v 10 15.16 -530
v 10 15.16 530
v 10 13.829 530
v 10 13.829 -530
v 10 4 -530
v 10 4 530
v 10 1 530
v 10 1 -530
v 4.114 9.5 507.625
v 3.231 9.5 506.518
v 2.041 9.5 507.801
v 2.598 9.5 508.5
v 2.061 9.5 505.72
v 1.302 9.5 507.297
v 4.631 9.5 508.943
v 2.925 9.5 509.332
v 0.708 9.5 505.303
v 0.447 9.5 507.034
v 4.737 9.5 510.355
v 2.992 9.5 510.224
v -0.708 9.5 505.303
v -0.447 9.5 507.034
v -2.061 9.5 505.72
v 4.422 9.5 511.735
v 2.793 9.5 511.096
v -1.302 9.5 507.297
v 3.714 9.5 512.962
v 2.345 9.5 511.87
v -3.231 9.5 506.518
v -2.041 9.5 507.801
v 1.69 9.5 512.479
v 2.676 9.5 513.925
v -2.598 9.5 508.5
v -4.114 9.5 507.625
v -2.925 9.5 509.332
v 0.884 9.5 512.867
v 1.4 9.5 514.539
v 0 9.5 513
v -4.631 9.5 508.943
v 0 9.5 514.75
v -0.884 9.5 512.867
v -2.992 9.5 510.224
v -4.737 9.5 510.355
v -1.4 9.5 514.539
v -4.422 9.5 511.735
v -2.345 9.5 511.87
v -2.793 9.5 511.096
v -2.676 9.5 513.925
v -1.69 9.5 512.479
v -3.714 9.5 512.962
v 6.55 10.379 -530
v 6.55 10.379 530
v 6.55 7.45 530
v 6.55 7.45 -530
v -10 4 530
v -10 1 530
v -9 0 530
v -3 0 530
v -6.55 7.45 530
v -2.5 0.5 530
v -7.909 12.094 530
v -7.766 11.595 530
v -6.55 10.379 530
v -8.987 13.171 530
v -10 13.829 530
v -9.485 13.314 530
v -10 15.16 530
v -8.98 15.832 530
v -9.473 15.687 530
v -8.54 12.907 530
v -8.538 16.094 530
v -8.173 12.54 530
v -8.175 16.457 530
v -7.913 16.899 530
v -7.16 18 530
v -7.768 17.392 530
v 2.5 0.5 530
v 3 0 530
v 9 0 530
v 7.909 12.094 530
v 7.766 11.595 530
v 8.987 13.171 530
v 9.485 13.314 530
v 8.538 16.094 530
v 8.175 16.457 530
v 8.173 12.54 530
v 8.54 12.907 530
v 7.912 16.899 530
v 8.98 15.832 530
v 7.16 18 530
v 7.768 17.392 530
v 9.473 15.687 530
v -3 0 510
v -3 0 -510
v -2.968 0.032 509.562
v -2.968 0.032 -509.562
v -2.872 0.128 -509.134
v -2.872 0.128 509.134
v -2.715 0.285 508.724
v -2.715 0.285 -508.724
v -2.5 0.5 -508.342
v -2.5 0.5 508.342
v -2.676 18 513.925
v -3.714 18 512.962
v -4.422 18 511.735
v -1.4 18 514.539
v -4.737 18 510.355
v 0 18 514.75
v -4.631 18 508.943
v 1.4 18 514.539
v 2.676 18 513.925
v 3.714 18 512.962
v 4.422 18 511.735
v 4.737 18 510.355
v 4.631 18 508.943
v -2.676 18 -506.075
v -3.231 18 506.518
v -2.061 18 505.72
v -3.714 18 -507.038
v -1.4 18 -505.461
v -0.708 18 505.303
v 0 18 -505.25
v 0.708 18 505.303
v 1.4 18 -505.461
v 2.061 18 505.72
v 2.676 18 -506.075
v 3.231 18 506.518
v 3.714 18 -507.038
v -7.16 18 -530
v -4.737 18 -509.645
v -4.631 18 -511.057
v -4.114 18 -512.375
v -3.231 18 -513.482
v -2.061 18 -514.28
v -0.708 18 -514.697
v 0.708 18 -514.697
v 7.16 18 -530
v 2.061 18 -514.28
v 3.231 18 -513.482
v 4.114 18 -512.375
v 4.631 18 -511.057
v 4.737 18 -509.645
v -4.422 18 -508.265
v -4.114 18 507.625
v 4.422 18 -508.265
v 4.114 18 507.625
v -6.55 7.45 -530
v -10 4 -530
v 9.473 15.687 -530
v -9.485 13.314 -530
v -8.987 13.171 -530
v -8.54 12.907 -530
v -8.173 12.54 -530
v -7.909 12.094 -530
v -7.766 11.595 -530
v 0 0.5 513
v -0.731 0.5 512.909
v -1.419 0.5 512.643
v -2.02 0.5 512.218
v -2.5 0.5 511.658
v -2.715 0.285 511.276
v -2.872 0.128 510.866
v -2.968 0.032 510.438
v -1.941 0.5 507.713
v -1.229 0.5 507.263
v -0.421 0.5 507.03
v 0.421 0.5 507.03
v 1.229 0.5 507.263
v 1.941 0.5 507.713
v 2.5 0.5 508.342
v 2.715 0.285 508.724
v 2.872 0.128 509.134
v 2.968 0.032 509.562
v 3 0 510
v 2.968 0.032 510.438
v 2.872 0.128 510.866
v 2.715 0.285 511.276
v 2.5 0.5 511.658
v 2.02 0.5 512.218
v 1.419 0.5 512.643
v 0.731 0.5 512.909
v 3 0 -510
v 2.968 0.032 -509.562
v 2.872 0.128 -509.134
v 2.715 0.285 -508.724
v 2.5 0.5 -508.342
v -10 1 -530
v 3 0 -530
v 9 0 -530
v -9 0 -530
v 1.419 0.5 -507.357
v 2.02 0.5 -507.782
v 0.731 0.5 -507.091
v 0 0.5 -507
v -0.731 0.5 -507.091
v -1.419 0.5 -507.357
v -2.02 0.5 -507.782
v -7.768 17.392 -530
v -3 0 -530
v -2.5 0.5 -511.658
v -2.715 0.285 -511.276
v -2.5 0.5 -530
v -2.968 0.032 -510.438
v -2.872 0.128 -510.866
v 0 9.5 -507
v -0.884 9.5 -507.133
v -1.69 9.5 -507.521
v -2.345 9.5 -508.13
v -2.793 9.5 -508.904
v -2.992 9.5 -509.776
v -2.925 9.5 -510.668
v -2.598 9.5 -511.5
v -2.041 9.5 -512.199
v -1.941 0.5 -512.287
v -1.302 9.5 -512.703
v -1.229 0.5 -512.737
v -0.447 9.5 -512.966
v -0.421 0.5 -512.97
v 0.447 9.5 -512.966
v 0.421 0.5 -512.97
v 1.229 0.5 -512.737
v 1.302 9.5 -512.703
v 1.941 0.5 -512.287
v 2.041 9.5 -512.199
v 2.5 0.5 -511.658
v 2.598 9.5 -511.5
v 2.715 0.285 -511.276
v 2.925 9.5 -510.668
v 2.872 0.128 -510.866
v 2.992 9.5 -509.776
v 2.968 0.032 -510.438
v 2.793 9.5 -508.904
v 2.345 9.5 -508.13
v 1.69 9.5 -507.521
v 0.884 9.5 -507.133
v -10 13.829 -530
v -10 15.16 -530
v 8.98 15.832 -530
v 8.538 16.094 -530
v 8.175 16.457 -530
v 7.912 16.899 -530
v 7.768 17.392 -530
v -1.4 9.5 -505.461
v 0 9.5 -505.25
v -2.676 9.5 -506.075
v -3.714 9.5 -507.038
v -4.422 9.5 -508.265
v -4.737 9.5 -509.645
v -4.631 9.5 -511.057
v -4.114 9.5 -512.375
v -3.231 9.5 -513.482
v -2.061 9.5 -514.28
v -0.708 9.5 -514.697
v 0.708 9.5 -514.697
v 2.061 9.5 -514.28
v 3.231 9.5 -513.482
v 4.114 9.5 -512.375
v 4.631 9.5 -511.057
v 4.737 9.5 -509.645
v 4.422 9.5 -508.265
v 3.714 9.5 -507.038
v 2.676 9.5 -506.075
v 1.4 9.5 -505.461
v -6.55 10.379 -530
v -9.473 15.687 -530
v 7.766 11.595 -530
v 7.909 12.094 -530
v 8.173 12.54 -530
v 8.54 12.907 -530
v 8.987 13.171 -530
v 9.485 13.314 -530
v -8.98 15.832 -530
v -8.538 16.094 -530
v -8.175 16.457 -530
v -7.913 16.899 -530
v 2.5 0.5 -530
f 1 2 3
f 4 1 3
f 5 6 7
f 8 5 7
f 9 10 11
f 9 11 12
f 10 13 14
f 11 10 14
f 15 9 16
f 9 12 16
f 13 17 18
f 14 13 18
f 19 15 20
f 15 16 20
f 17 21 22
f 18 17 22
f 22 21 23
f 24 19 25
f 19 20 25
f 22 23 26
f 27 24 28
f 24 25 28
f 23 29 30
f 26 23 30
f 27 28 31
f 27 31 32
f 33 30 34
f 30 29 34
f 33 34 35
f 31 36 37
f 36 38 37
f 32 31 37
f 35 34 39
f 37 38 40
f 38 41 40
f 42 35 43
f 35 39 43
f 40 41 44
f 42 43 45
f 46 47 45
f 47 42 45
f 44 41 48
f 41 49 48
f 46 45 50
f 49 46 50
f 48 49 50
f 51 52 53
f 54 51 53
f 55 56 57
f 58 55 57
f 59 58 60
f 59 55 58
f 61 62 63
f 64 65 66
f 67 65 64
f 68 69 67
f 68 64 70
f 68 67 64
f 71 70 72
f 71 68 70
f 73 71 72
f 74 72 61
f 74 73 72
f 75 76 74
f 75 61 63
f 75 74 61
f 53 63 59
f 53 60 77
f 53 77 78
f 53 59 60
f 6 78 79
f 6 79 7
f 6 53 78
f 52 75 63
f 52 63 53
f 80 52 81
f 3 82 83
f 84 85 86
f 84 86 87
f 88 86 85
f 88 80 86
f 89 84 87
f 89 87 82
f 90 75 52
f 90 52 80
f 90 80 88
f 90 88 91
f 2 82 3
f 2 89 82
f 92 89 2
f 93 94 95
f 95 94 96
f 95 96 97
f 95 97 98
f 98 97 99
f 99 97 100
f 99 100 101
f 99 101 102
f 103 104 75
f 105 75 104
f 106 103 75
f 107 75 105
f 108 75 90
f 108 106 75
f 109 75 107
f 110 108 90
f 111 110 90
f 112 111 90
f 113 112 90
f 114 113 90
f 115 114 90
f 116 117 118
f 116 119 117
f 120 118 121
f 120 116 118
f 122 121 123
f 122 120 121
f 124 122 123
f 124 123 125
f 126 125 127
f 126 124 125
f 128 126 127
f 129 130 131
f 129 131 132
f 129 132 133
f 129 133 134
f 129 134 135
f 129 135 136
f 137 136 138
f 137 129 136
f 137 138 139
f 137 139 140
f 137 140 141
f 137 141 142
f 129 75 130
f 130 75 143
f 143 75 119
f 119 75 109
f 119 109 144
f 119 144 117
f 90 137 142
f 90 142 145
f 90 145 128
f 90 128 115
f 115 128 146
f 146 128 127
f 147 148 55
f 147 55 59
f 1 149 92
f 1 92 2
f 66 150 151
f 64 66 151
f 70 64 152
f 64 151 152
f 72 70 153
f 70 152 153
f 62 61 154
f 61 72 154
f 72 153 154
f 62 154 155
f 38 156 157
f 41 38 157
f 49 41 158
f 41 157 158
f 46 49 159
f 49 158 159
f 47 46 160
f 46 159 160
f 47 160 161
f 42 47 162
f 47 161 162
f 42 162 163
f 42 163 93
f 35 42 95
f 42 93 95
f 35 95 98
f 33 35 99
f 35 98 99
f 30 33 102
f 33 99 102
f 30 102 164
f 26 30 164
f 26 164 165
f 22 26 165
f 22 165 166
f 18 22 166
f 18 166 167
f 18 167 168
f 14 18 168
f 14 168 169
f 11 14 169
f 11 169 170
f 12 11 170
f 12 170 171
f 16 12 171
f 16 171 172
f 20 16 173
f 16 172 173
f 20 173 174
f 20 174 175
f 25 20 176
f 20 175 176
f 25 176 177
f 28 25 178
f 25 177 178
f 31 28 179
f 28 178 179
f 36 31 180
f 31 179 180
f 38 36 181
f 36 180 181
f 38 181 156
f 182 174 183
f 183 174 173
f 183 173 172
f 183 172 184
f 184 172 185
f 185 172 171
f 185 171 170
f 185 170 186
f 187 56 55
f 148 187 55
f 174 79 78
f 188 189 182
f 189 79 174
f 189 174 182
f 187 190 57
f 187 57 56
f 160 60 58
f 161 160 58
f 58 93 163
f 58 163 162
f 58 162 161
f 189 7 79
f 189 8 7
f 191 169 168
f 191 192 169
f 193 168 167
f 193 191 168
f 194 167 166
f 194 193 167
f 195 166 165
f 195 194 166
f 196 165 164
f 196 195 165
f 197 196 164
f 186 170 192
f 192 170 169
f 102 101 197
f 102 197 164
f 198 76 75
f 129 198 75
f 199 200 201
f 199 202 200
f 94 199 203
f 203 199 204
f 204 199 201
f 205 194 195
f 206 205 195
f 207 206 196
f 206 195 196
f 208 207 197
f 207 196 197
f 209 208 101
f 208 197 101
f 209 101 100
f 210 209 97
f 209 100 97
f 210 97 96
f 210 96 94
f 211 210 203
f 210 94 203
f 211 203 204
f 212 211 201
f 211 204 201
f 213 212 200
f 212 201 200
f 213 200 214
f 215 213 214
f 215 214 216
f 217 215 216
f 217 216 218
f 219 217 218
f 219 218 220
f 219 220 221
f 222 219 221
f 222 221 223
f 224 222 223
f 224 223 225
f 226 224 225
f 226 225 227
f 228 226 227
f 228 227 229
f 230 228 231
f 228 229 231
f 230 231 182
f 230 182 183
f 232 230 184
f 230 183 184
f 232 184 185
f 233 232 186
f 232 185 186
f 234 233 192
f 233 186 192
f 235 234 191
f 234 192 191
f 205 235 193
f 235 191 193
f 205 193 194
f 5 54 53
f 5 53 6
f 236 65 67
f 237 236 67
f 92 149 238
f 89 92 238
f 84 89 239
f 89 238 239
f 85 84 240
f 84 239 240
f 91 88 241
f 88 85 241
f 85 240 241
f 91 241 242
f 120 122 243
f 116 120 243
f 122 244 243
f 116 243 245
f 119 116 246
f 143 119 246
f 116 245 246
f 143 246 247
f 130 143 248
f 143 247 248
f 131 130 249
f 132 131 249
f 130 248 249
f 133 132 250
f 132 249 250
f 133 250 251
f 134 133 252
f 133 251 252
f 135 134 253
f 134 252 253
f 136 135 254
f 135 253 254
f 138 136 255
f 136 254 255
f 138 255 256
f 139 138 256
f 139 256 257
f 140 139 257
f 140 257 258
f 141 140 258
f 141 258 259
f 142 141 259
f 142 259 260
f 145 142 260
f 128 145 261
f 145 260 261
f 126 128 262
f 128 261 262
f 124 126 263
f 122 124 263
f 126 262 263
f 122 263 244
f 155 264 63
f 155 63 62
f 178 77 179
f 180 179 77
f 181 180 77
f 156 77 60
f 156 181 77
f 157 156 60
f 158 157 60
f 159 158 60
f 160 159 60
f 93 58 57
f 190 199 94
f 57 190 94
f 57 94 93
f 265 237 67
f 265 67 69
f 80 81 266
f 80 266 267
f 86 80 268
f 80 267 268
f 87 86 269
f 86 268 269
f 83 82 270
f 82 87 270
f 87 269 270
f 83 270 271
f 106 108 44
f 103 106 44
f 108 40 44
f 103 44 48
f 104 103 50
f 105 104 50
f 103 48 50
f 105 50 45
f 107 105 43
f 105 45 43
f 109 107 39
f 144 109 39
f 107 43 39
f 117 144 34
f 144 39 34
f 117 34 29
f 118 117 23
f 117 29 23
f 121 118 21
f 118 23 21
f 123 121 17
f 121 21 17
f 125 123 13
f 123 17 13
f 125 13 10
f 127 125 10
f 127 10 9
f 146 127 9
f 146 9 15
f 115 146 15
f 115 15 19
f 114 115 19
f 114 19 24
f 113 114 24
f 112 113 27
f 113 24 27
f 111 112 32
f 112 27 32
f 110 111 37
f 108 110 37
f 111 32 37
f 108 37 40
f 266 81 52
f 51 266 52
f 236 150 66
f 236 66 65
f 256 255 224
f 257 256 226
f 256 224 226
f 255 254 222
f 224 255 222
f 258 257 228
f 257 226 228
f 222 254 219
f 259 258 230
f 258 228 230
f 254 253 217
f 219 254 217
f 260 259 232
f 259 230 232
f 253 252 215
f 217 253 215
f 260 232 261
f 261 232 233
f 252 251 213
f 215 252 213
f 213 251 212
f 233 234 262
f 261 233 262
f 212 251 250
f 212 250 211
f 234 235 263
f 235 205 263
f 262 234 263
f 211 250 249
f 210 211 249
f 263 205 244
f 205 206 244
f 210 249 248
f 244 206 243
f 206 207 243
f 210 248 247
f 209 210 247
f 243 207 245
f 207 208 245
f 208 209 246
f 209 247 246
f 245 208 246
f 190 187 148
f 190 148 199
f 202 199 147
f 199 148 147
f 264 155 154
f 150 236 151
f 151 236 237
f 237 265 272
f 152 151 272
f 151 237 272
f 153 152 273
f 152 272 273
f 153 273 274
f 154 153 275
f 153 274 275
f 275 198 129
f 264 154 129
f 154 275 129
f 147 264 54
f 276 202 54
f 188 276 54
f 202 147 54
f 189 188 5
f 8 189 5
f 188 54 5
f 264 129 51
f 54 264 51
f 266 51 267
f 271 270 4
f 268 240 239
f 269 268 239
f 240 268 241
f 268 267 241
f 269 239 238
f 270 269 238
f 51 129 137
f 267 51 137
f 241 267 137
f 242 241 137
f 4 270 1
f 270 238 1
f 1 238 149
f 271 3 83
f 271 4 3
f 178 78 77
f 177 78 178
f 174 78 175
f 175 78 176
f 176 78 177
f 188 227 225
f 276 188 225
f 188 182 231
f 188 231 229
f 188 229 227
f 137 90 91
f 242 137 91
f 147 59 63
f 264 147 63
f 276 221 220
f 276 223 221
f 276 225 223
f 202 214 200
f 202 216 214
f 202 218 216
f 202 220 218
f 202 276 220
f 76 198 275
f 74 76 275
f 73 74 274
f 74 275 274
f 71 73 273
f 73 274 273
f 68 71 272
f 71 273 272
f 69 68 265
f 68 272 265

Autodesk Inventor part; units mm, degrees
ref_plane "YZ Plane" through (0, 0, 0) normal (1, 0, 0) x (0, 1, 0)
ref_plane "XZ Plane" through (0, 0, 0) normal (0, 1, 0) x (-1, 0, 0)
ref_plane "XY Plane" through (0, 0, 0) normal (0, 0, 1) x (1, 0, 0)
sketch "Sketch4" plane through (0, 0, 0) normal (0, 0, 1) x (1, 0, 0)
  line L0 (10, 4.0001) -> (10, 1)
  line L1 (6.55, 7.45) -> (10, 4.0001)
  line L2 (6.55, 10.3792) -> (6.55, 7.45)
  line L3 (7.7659, 11.5951) -> (6.55, 10.3792)
  arc A0 (9.4852, 13.3144) -> (7.7659, 11.5951) centre (9.8015, 11.2788) ccw
  line L4 (10, 13.8292) -> (9.4852, 13.3144)
  line L5 (10, 15.16) -> (10, 13.8292)
  line L6 (9.4727, 15.6874) -> (10, 15.16)
  arc A1 (7.7679, 17.3921) -> (9.4727, 15.6874) centre (9.8015, 17.7209) ccw
  line L7 (7.16, 18) -> (7.7679, 17.3921)
  line L8 (-7.16, 18) -> (7.16, 18)
  line L9 (-7.7679, 17.3921) -> (-7.16, 18)
  arc A2 (-9.4727, 15.6874) -> (-7.7679, 17.3921) centre (-9.8015, 17.7209) ccw
  line L10 (-10, 15.16) -> (-9.4727, 15.6874)
  line L11 (-10, 13.8292) -> (-10, 15.16)
  line L12 (-9.4852, 13.3144) -> (-10, 13.8292)
  arc A3 (-7.7659, 11.5951) -> (-9.4852, 13.3144) centre (-9.8015, 11.2788) ccw
  line L13 (-6.55, 10.3792) -> (-7.7659, 11.5951)
  line L14 (-6.55, 7.45) -> (-6.55, 10.3792)
  line L15 (-10, 4.0001) -> (-6.55, 7.45)
  line L16 (-10, 1) -> (-10, 4.0001)
  line L17 (-9, 0) -> (-10, 1)
  line L18 (-3, 0) -> (-9, 0)
  line L19 (-2.5, 0.5) -> (-3, 0)
  line L20 (2.5, 0.5) -> (-2.5, 0.5)
  line L21 (3, 0) -> (2.5, 0.5)
  line L22 (9, 0) -> (3, 0)
  line L23 (10, 1) -> (9, 0)
  point P0 (0, 0)
  point P1 (0, 0)
extrude "Extrusion4" add sketch "Sketch4" along normal mid plane 1060
sketch "Sketch5" plane through (-7.16, 18, 530) normal (0, 1, 0) x (1, 0, 0)
  line L0 (0, 0) -> (14.3201, 0) projected
  line L1 (0, 1060) -> (0, 0) projected
  line L2 (7.16, 0) -> (7.16, 20)
  point P0 (7.16, 530)
  dimension "d8" = 20
hole "Hole1" at (0, 18, 510) direction (0, -1, 0) diameter 6 end through all counterbore diameter 9.5 counterbore depth 8.5
pattern_linear "Rectangular Pattern1" count 2 spacing 1020 along (0, 0, -1) of "Hole1"
equation "\"d6\" = L"
equation "\"d8\" = testa"
equation "\"d18\" = passo"
equation "\"passo\" = 1020"
equation "\"testa\" = 20"
equation "\"L\" = 1060"
properties part number "HSR20-xxxx-01" material "Steel"
